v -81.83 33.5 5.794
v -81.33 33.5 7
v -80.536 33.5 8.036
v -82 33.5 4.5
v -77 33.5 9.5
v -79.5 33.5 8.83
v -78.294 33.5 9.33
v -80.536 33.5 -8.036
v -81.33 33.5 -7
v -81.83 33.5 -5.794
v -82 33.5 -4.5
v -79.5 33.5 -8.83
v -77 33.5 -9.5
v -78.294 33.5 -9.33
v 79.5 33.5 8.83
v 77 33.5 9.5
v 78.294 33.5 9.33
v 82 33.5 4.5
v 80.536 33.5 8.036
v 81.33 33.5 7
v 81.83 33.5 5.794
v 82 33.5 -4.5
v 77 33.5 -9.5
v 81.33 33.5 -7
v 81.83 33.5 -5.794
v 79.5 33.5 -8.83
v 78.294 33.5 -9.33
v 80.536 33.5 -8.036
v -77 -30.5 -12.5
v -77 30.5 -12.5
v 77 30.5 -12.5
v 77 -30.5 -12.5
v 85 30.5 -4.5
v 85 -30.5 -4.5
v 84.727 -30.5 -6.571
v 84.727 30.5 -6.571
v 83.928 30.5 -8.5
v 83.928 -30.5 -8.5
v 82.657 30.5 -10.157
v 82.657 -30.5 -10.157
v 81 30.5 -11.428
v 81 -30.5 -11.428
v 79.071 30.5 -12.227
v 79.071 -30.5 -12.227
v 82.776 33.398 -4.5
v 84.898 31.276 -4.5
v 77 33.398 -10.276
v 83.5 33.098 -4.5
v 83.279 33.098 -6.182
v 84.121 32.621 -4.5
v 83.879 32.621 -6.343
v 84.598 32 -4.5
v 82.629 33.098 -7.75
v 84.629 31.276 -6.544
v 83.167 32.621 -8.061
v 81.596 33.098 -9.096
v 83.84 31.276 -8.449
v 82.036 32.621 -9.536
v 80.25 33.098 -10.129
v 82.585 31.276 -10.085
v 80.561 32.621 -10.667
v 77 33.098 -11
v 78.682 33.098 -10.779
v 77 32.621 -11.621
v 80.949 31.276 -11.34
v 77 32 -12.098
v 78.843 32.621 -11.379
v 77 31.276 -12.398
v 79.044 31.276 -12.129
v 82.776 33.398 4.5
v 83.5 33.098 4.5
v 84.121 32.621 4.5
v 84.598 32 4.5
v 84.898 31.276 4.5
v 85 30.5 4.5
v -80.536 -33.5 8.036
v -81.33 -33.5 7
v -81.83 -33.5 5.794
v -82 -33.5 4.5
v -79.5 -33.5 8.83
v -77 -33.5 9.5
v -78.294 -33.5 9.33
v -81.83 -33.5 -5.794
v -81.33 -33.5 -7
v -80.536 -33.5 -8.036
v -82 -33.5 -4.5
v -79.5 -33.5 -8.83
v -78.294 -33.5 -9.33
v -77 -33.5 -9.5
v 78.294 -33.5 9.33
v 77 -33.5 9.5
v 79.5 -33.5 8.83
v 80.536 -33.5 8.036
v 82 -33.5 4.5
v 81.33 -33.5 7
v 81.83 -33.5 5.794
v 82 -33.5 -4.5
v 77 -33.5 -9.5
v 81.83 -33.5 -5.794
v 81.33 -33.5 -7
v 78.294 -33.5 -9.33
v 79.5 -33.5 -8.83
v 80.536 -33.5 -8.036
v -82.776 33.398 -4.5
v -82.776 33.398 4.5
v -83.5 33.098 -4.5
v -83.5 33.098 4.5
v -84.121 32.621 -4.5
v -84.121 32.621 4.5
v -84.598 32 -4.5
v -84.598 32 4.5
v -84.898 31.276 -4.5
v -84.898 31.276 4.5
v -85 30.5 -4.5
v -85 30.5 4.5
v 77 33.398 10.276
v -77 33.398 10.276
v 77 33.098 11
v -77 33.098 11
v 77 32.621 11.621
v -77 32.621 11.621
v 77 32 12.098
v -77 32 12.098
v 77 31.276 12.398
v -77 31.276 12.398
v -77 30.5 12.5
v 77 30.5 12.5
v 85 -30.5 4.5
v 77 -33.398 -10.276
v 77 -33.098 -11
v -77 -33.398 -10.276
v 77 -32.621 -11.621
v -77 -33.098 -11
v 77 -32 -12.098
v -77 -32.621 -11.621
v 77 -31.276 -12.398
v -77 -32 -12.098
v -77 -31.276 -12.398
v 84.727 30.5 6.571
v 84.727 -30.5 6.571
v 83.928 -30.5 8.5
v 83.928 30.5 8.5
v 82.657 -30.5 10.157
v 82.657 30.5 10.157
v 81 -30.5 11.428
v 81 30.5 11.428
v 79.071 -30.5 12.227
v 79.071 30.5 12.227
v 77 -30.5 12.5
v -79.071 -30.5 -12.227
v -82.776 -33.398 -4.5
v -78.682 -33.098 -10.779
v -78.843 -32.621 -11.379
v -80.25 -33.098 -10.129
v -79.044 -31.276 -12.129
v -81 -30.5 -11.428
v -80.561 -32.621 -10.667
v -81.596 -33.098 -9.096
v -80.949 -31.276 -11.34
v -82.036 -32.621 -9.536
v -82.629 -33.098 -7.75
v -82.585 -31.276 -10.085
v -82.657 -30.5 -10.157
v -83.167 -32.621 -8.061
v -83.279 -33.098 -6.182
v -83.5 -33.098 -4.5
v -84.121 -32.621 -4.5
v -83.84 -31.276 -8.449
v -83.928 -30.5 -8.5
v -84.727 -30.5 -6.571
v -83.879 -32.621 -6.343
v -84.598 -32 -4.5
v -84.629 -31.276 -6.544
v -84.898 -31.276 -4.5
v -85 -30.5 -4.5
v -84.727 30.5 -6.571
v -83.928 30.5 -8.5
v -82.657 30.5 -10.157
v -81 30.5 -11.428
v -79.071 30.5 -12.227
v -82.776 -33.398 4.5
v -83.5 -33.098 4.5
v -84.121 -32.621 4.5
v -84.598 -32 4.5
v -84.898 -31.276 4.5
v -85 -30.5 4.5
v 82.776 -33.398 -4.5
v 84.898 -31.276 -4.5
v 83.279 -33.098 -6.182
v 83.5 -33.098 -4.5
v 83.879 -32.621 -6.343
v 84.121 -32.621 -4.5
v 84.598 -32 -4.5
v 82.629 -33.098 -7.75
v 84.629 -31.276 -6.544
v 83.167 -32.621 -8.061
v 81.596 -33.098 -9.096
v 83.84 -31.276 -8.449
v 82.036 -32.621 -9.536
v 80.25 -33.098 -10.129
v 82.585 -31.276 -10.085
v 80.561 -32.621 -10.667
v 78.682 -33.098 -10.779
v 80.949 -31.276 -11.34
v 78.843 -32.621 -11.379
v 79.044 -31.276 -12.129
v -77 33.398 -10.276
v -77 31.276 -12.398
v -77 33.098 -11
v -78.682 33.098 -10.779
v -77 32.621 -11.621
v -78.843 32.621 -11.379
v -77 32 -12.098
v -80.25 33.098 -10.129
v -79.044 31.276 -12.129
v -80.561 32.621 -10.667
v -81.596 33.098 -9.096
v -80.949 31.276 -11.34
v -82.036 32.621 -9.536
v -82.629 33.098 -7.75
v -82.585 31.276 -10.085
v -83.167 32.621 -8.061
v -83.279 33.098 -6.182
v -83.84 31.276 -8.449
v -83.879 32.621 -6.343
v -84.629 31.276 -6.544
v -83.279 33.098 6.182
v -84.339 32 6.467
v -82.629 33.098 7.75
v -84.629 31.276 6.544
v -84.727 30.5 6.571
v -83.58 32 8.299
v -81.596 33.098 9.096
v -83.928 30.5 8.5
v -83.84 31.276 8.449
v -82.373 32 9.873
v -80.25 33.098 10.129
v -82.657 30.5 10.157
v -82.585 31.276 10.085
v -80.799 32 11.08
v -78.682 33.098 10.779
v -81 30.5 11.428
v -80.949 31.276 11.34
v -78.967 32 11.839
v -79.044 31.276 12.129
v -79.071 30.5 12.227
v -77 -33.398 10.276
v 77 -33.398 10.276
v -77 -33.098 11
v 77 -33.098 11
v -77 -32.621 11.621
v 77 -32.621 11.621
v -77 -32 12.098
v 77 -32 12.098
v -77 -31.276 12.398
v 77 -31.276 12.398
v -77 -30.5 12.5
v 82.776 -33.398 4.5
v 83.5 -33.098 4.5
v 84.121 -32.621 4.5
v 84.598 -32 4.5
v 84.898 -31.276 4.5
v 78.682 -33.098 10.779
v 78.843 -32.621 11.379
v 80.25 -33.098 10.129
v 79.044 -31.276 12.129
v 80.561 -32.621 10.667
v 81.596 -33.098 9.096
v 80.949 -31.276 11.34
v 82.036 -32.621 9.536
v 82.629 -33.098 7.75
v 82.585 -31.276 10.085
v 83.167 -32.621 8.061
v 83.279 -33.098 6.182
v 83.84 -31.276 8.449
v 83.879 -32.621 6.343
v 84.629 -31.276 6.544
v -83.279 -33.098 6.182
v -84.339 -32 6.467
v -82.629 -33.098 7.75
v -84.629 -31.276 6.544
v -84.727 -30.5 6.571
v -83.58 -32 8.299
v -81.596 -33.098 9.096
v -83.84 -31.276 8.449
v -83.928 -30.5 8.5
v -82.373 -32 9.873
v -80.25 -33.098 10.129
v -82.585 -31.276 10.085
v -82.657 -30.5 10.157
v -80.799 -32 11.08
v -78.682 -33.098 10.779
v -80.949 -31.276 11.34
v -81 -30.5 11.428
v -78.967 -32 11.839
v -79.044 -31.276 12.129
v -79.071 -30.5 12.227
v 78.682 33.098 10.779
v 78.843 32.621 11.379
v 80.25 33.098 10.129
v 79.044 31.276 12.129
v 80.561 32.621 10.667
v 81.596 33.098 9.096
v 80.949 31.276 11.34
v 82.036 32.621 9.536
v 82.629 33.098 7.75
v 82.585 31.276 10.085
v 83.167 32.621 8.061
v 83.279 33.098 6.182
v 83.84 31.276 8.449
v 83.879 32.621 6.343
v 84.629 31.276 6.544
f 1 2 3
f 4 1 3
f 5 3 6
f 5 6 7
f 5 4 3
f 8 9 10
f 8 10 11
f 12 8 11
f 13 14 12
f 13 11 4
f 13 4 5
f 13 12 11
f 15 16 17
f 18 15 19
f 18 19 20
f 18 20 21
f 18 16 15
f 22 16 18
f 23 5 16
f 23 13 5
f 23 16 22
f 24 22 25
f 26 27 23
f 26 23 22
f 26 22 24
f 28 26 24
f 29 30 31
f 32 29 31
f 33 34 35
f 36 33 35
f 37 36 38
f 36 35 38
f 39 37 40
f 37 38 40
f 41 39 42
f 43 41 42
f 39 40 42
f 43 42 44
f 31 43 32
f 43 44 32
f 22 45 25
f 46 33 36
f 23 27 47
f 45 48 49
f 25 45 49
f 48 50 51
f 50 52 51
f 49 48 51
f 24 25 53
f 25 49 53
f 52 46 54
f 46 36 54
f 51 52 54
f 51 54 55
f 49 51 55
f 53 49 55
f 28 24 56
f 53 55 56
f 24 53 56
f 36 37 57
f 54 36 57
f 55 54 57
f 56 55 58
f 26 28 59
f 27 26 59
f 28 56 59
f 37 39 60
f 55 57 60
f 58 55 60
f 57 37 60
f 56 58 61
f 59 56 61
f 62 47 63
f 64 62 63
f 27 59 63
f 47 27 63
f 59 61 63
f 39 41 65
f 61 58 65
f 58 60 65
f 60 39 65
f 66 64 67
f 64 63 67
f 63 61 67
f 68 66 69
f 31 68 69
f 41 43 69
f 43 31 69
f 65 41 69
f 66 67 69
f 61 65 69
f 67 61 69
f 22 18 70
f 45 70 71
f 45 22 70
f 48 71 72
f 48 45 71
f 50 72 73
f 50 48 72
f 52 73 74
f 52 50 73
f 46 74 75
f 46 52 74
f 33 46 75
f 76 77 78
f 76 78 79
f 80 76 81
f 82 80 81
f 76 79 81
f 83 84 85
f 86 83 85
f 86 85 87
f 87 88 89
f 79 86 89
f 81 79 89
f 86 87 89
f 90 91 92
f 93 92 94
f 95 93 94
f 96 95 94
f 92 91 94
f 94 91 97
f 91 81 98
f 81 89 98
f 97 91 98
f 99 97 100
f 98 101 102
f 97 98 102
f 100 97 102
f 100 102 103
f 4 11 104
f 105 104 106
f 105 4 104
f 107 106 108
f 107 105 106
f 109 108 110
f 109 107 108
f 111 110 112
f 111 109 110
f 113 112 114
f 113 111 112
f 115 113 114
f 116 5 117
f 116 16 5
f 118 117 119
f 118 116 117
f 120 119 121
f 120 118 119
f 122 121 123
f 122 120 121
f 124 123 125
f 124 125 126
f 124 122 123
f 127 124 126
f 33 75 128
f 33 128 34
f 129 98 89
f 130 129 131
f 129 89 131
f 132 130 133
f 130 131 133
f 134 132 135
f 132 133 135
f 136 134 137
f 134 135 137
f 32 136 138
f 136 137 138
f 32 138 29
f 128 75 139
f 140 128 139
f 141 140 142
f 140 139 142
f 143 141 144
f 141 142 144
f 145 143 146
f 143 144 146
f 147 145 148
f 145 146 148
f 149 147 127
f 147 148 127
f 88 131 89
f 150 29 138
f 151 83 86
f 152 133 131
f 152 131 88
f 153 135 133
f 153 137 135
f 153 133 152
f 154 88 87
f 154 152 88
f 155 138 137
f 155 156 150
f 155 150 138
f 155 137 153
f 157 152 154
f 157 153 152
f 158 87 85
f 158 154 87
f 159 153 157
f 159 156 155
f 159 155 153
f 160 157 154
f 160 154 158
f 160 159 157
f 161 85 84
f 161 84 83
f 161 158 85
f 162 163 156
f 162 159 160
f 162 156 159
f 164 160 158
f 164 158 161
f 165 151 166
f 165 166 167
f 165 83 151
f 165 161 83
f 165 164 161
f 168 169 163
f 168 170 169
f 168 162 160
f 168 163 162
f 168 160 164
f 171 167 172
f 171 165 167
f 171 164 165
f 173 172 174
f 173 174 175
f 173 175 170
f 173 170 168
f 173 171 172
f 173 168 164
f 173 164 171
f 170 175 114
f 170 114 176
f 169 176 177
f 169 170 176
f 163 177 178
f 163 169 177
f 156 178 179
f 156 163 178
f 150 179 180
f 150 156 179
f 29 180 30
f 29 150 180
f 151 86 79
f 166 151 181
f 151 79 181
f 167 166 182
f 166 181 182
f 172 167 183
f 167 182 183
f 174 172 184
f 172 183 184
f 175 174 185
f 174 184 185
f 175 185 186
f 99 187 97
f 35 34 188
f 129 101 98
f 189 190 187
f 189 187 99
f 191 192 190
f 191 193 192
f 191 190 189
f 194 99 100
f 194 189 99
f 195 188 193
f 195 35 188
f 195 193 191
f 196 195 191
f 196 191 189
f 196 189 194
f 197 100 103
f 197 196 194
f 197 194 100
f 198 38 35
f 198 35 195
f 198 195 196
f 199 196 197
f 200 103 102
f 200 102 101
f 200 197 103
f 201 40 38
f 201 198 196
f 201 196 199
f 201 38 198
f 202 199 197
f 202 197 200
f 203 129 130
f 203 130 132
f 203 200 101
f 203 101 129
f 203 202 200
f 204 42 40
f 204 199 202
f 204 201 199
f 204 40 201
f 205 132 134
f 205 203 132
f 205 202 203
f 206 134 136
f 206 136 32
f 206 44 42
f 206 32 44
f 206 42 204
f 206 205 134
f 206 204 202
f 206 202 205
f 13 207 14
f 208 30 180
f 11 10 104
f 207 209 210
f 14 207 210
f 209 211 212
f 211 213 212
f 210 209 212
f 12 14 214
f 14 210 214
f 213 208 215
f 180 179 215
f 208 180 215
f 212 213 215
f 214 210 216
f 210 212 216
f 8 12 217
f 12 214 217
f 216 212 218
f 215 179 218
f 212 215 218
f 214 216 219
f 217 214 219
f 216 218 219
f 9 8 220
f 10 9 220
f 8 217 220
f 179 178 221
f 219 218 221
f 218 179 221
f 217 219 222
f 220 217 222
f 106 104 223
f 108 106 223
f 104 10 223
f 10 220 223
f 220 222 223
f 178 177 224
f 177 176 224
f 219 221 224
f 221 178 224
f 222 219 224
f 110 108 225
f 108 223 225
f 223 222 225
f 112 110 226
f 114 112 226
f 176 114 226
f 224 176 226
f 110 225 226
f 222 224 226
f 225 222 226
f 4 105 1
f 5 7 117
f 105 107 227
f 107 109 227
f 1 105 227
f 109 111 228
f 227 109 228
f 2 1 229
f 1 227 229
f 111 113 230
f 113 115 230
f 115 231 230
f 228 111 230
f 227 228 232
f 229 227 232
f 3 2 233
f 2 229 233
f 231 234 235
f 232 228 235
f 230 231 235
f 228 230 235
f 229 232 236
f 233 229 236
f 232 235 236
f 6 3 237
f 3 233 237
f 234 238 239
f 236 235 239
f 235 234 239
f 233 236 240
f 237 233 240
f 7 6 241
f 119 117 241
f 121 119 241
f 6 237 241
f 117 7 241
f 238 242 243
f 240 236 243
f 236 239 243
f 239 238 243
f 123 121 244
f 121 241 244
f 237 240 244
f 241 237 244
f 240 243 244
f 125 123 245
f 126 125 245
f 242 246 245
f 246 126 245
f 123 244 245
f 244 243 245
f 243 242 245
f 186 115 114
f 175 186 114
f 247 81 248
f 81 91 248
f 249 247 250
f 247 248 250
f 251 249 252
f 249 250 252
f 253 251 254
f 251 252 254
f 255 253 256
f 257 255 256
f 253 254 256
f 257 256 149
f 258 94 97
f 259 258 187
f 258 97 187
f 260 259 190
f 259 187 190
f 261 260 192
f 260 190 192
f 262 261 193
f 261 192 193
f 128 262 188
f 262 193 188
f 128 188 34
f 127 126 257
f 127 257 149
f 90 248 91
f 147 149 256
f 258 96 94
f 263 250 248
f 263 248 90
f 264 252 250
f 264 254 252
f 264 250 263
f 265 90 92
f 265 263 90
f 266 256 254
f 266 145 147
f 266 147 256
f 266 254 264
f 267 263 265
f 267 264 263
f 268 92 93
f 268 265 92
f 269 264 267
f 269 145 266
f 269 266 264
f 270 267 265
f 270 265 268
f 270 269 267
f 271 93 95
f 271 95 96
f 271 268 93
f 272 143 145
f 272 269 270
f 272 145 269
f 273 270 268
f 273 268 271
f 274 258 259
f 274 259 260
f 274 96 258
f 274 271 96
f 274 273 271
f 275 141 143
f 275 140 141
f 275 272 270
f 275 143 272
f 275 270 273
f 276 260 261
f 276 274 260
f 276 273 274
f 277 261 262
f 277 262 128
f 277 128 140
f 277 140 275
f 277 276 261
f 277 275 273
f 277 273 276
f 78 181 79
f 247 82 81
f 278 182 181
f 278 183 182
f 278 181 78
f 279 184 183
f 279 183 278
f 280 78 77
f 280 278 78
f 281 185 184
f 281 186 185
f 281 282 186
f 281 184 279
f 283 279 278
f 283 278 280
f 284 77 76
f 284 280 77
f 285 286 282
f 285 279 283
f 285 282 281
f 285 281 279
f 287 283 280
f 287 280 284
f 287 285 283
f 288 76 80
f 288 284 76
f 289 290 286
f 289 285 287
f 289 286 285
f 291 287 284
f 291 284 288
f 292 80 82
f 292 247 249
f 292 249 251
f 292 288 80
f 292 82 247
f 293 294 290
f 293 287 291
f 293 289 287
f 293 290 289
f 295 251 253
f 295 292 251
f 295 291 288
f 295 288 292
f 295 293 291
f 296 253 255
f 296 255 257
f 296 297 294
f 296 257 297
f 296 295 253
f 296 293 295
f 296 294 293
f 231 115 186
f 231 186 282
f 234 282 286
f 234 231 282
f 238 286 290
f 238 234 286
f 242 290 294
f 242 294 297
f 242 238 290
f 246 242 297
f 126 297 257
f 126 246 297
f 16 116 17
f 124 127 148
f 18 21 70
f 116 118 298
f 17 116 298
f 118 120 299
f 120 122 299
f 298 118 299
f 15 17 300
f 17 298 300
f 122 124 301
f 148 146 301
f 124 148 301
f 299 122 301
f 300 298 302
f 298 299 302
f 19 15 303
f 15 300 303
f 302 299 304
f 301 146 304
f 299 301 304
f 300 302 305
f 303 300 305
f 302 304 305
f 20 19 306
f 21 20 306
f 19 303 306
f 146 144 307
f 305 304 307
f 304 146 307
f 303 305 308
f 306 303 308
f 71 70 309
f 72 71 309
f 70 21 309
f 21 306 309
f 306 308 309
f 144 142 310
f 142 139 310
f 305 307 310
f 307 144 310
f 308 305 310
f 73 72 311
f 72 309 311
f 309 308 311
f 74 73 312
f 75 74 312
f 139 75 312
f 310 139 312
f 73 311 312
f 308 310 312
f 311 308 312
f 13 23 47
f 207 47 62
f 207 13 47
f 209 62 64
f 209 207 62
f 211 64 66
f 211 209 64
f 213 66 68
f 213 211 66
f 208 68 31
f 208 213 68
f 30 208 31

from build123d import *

# Parameters (mm, degrees)
SKETCH1_W           = 170
SKETCH1_H           = 25
BOSS_EXTRUDE1_DEPTH = 33.5
FILLET1_R           = 8
FILLET2_R           = 3


with BuildPart() as part:
    # Sketch1 → Boss-Extrude1 (new body, symmetric)
    with BuildSketch(Plane(origin=(0, 0, 0), x_dir=(1, 0, 0), z_dir=(0, 1, 0))):
        Rectangle(SKETCH1_W, SKETCH1_H)
    extrude(amount=BOSS_EXTRUDE1_DEPTH, both=True)

    # Fillet1
    fillet1_edges = [part.edges().sort_by_distance(p)[0] for p in [
        (-85, 0, -12.5),
        (85, 0, -12.5),
        (85, 0, 12.5),
        (-85, 0, 12.5),
    ]]
    fillet(fillet1_edges, radius=FILLET1_R)

    # Fillet2
    fillet2_edges = [part.edges().sort_by_distance(p)[0] for p in [
        (0, -33.5, 12.5),
        (0, 33.5, 12.5),
        (-85, -33.5, 0),
        (0, -33.5, -12.5),
        (85, -33.5, 0),
        (82.656854249, -33.5, 10.156854249),
        (82.656854249, -33.5, -10.156854249),
        (-82.656854249, -33.5, -10.156854249),
        (-82.656854249, -33.5, 10.156854249),
        (-85, 33.5, 0),
        (85, 33.5, 0),
        (0, 33.5, -12.5),
        (82.656854249, 33.5, 10.156854249),
        (82.656854249, 33.5, -10.156854249),
        (-82.656854249, 33.5, -10.156854249),
        (-82.656854249, 33.5, 10.156854249),
    ]]
    fillet(fillet2_edges, radius=FILLET2_R)


solid = part.part
